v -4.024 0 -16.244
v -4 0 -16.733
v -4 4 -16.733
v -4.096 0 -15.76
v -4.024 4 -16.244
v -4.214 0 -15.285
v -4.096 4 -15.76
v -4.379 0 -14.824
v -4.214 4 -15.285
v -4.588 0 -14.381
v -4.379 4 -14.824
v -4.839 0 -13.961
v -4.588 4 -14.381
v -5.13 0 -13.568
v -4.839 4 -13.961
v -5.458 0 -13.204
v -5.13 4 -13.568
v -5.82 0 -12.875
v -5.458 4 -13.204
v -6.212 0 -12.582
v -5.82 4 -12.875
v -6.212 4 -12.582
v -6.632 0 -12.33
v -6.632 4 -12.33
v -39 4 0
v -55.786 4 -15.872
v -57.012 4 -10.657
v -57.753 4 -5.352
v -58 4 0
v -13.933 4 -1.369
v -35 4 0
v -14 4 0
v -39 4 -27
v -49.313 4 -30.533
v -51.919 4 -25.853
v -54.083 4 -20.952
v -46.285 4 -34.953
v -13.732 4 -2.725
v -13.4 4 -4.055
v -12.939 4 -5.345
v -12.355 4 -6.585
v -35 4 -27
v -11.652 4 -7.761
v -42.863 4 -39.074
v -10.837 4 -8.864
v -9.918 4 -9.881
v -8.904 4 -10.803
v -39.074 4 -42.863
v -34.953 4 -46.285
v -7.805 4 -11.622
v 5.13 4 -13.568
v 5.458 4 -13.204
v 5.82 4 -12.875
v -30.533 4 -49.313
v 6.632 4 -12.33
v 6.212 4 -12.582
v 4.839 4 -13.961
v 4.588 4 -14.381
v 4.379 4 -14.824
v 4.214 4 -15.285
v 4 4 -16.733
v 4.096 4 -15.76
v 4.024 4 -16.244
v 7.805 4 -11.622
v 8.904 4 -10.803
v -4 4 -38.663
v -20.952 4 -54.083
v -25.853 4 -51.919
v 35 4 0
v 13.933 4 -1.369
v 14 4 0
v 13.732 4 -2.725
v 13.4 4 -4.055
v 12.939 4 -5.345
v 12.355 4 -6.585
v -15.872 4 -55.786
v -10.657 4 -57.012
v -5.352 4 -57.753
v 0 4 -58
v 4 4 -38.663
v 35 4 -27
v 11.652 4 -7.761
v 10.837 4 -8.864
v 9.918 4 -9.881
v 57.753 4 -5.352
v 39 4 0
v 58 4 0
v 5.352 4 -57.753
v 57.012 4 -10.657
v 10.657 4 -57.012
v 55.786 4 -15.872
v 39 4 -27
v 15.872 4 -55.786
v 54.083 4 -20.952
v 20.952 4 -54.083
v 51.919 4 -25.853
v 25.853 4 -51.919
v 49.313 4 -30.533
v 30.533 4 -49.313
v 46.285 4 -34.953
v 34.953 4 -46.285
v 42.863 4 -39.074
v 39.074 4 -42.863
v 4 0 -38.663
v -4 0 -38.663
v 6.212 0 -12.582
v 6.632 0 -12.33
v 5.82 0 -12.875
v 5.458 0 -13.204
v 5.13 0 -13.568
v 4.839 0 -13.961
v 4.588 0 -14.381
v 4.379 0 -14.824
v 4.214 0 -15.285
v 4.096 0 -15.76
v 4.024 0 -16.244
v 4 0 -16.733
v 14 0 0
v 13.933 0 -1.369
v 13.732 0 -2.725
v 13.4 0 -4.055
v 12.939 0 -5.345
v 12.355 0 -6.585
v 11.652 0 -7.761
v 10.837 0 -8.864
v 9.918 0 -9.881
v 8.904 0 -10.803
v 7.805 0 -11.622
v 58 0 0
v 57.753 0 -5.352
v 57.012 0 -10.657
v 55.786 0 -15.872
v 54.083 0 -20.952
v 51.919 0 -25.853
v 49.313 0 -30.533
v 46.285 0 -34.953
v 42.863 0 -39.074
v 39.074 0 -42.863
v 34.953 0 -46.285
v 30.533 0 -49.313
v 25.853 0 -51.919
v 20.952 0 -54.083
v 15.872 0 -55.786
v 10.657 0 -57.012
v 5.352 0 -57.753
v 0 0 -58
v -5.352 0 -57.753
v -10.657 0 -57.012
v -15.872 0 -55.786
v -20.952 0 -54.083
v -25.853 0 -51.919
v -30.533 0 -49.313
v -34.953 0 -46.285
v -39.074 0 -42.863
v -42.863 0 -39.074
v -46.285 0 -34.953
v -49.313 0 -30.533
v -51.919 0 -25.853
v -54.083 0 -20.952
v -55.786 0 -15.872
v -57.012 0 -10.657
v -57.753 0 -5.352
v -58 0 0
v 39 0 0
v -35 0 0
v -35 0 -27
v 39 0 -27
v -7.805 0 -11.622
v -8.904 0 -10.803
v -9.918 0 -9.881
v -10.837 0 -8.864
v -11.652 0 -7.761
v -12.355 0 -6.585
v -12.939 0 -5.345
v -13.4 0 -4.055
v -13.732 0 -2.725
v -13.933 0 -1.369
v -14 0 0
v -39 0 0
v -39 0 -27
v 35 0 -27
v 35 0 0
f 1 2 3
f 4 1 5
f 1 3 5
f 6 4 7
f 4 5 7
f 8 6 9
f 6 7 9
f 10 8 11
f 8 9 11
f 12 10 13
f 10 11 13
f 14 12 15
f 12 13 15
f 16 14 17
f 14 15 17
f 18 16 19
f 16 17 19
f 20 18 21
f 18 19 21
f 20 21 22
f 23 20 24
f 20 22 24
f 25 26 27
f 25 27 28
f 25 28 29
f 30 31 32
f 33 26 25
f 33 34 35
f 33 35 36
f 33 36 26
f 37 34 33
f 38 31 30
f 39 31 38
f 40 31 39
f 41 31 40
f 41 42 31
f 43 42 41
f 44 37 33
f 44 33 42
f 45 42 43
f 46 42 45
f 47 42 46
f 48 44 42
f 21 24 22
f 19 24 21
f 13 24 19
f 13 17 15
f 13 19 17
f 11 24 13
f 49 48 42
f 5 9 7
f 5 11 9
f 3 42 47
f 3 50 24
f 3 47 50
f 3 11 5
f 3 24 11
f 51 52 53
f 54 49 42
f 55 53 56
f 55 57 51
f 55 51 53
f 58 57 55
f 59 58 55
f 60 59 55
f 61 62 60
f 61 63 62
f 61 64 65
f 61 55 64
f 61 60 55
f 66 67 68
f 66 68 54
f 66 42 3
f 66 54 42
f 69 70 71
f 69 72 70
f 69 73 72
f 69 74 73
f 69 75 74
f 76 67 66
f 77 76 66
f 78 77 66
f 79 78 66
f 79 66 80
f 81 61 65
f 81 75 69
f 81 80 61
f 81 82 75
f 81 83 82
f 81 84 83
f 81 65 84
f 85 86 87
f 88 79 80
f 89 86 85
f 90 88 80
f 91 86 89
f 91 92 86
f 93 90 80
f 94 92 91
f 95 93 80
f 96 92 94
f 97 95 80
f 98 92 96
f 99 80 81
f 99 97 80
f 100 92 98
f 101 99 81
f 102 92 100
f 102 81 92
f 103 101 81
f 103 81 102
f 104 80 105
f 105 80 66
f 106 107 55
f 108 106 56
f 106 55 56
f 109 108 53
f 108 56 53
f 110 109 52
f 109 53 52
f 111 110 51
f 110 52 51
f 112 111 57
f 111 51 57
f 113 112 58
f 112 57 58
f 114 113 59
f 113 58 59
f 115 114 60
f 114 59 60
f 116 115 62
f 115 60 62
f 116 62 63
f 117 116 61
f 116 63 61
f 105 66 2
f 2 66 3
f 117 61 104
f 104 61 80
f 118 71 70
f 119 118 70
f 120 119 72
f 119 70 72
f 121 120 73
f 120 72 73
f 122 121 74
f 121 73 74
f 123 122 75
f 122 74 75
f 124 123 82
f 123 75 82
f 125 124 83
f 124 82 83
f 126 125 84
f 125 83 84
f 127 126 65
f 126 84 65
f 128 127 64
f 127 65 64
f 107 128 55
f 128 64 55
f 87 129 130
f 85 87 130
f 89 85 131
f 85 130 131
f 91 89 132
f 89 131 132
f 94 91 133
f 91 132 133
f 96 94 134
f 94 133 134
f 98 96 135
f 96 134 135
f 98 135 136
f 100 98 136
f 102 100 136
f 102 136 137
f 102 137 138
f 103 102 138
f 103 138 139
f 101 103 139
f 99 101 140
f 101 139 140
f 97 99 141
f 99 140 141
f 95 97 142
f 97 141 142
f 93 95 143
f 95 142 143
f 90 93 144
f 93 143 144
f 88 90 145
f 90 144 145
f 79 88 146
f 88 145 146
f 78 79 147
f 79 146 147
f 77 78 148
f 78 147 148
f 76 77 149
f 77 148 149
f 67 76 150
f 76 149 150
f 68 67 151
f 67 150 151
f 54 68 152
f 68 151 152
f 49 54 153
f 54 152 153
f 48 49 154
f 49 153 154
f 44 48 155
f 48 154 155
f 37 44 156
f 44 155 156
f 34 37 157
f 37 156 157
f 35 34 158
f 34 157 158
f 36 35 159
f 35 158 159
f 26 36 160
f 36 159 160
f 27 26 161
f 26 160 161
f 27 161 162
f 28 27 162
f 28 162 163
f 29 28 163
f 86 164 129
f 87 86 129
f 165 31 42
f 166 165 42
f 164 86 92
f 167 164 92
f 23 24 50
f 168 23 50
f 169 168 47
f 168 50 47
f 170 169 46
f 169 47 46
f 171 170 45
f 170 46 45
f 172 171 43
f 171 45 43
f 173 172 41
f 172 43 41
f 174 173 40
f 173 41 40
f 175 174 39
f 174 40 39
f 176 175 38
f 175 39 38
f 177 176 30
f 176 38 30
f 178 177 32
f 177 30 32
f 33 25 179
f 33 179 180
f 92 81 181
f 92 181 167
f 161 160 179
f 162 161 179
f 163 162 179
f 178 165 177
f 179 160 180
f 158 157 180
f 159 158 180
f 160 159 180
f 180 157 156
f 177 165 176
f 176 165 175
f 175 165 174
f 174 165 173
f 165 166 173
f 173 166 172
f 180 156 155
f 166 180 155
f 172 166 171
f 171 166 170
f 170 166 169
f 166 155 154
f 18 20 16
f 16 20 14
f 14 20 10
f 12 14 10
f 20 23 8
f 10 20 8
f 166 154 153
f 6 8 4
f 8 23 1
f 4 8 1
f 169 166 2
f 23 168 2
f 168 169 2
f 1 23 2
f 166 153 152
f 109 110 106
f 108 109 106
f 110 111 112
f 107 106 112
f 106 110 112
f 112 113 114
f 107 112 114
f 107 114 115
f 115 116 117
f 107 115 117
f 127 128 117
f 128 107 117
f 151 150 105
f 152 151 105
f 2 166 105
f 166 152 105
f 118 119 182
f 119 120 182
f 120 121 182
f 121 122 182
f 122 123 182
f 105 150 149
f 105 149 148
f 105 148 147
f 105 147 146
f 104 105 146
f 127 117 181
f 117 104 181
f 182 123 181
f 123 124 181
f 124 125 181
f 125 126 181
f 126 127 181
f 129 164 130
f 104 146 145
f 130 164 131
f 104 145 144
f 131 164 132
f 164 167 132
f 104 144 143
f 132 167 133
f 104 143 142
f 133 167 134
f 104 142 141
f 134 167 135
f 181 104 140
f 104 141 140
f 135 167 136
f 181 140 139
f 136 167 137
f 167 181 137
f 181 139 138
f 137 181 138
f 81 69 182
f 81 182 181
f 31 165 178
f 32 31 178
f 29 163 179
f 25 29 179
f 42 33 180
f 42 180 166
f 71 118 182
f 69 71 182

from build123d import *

# Parameters (mm, degrees)
BOSS_EXTRUDE1_DEPTH = 4
SKETCH2_W           = 4
SKETCH2_H           = 27
CUT_EXTRUDE1_DEPTH  = 83.121860671
CUT_EXTRUDE2_DEPTH  = 83.121860671


with BuildPart() as part:
    # Sketch1 → Boss-Extrude1 (new body)
    with BuildSketch(Plane(origin=(0, 0, 0), x_dir=(1, 0, 0), z_dir=(0, 1, 0))):
        with BuildLine():
            Line((-58, 0), (58, 0))
            ThreePointArc((58, 0), (0, 58), (-58, 0))
        make_face()
    extrude(amount=BOSS_EXTRUDE1_DEPTH)

    # Sketch2 → Cut-Extrude1 (cut, through all)
    with BuildSketch(Plane(origin=(0, 4, 0), x_dir=(1, 0, 0), z_dir=(0, 1, 0))):
        with Locations((37, 13.5)):
            Rectangle(SKETCH2_W, SKETCH2_H)
        with Locations((-37, 13.5)):
            Rectangle(SKETCH2_W, SKETCH2_H)
    extrude(amount=-CUT_EXTRUDE1_DEPTH, mode=Mode.SUBTRACT)

    # Sketch3 → Cut-Extrude2 (cut, through all)
    with BuildSketch(Plane(origin=(0, 4, 0), x_dir=(1, 0, 0), z_dir=(0, 1, 0))):
        with BuildLine():
            Line((4, 38.663200531), (0, 38.663200531))
            Line((0, 38.663200531), (0, 0))
            Line((0, 0), (14, 0))
            ThreePointArc((14, 0), (12.017531054, 7.181848465), (6.631578947, 12.329726707))
            ThreePointArc((6.631578947, 12.329726707), (4.708024624, 14.16825465), (4, 16.733200531))
            Line((4, 16.733200531), (4, 38.663200531))
        make_face()
        with BuildLine():
            Line((-4, 38.663200531), (-4, 16.733200531))
            ThreePointArc((-4, 16.733200531), (-4.708024624, 14.16825465), (-6.631578947, 12.329726707))
            ThreePointArc((-6.631578947, 12.329726707), (-12.017531054, 7.181848465), (-14, 0))
            Line((-14, 0), (0, 0))
            Line((0, 0), (0, 38.663200531))
            Line((0, 38.663200531), (-4, 38.663200531))
        make_face()
    extrude(amount=-CUT_EXTRUDE2_DEPTH, mode=Mode.SUBTRACT)


solid = part.part
